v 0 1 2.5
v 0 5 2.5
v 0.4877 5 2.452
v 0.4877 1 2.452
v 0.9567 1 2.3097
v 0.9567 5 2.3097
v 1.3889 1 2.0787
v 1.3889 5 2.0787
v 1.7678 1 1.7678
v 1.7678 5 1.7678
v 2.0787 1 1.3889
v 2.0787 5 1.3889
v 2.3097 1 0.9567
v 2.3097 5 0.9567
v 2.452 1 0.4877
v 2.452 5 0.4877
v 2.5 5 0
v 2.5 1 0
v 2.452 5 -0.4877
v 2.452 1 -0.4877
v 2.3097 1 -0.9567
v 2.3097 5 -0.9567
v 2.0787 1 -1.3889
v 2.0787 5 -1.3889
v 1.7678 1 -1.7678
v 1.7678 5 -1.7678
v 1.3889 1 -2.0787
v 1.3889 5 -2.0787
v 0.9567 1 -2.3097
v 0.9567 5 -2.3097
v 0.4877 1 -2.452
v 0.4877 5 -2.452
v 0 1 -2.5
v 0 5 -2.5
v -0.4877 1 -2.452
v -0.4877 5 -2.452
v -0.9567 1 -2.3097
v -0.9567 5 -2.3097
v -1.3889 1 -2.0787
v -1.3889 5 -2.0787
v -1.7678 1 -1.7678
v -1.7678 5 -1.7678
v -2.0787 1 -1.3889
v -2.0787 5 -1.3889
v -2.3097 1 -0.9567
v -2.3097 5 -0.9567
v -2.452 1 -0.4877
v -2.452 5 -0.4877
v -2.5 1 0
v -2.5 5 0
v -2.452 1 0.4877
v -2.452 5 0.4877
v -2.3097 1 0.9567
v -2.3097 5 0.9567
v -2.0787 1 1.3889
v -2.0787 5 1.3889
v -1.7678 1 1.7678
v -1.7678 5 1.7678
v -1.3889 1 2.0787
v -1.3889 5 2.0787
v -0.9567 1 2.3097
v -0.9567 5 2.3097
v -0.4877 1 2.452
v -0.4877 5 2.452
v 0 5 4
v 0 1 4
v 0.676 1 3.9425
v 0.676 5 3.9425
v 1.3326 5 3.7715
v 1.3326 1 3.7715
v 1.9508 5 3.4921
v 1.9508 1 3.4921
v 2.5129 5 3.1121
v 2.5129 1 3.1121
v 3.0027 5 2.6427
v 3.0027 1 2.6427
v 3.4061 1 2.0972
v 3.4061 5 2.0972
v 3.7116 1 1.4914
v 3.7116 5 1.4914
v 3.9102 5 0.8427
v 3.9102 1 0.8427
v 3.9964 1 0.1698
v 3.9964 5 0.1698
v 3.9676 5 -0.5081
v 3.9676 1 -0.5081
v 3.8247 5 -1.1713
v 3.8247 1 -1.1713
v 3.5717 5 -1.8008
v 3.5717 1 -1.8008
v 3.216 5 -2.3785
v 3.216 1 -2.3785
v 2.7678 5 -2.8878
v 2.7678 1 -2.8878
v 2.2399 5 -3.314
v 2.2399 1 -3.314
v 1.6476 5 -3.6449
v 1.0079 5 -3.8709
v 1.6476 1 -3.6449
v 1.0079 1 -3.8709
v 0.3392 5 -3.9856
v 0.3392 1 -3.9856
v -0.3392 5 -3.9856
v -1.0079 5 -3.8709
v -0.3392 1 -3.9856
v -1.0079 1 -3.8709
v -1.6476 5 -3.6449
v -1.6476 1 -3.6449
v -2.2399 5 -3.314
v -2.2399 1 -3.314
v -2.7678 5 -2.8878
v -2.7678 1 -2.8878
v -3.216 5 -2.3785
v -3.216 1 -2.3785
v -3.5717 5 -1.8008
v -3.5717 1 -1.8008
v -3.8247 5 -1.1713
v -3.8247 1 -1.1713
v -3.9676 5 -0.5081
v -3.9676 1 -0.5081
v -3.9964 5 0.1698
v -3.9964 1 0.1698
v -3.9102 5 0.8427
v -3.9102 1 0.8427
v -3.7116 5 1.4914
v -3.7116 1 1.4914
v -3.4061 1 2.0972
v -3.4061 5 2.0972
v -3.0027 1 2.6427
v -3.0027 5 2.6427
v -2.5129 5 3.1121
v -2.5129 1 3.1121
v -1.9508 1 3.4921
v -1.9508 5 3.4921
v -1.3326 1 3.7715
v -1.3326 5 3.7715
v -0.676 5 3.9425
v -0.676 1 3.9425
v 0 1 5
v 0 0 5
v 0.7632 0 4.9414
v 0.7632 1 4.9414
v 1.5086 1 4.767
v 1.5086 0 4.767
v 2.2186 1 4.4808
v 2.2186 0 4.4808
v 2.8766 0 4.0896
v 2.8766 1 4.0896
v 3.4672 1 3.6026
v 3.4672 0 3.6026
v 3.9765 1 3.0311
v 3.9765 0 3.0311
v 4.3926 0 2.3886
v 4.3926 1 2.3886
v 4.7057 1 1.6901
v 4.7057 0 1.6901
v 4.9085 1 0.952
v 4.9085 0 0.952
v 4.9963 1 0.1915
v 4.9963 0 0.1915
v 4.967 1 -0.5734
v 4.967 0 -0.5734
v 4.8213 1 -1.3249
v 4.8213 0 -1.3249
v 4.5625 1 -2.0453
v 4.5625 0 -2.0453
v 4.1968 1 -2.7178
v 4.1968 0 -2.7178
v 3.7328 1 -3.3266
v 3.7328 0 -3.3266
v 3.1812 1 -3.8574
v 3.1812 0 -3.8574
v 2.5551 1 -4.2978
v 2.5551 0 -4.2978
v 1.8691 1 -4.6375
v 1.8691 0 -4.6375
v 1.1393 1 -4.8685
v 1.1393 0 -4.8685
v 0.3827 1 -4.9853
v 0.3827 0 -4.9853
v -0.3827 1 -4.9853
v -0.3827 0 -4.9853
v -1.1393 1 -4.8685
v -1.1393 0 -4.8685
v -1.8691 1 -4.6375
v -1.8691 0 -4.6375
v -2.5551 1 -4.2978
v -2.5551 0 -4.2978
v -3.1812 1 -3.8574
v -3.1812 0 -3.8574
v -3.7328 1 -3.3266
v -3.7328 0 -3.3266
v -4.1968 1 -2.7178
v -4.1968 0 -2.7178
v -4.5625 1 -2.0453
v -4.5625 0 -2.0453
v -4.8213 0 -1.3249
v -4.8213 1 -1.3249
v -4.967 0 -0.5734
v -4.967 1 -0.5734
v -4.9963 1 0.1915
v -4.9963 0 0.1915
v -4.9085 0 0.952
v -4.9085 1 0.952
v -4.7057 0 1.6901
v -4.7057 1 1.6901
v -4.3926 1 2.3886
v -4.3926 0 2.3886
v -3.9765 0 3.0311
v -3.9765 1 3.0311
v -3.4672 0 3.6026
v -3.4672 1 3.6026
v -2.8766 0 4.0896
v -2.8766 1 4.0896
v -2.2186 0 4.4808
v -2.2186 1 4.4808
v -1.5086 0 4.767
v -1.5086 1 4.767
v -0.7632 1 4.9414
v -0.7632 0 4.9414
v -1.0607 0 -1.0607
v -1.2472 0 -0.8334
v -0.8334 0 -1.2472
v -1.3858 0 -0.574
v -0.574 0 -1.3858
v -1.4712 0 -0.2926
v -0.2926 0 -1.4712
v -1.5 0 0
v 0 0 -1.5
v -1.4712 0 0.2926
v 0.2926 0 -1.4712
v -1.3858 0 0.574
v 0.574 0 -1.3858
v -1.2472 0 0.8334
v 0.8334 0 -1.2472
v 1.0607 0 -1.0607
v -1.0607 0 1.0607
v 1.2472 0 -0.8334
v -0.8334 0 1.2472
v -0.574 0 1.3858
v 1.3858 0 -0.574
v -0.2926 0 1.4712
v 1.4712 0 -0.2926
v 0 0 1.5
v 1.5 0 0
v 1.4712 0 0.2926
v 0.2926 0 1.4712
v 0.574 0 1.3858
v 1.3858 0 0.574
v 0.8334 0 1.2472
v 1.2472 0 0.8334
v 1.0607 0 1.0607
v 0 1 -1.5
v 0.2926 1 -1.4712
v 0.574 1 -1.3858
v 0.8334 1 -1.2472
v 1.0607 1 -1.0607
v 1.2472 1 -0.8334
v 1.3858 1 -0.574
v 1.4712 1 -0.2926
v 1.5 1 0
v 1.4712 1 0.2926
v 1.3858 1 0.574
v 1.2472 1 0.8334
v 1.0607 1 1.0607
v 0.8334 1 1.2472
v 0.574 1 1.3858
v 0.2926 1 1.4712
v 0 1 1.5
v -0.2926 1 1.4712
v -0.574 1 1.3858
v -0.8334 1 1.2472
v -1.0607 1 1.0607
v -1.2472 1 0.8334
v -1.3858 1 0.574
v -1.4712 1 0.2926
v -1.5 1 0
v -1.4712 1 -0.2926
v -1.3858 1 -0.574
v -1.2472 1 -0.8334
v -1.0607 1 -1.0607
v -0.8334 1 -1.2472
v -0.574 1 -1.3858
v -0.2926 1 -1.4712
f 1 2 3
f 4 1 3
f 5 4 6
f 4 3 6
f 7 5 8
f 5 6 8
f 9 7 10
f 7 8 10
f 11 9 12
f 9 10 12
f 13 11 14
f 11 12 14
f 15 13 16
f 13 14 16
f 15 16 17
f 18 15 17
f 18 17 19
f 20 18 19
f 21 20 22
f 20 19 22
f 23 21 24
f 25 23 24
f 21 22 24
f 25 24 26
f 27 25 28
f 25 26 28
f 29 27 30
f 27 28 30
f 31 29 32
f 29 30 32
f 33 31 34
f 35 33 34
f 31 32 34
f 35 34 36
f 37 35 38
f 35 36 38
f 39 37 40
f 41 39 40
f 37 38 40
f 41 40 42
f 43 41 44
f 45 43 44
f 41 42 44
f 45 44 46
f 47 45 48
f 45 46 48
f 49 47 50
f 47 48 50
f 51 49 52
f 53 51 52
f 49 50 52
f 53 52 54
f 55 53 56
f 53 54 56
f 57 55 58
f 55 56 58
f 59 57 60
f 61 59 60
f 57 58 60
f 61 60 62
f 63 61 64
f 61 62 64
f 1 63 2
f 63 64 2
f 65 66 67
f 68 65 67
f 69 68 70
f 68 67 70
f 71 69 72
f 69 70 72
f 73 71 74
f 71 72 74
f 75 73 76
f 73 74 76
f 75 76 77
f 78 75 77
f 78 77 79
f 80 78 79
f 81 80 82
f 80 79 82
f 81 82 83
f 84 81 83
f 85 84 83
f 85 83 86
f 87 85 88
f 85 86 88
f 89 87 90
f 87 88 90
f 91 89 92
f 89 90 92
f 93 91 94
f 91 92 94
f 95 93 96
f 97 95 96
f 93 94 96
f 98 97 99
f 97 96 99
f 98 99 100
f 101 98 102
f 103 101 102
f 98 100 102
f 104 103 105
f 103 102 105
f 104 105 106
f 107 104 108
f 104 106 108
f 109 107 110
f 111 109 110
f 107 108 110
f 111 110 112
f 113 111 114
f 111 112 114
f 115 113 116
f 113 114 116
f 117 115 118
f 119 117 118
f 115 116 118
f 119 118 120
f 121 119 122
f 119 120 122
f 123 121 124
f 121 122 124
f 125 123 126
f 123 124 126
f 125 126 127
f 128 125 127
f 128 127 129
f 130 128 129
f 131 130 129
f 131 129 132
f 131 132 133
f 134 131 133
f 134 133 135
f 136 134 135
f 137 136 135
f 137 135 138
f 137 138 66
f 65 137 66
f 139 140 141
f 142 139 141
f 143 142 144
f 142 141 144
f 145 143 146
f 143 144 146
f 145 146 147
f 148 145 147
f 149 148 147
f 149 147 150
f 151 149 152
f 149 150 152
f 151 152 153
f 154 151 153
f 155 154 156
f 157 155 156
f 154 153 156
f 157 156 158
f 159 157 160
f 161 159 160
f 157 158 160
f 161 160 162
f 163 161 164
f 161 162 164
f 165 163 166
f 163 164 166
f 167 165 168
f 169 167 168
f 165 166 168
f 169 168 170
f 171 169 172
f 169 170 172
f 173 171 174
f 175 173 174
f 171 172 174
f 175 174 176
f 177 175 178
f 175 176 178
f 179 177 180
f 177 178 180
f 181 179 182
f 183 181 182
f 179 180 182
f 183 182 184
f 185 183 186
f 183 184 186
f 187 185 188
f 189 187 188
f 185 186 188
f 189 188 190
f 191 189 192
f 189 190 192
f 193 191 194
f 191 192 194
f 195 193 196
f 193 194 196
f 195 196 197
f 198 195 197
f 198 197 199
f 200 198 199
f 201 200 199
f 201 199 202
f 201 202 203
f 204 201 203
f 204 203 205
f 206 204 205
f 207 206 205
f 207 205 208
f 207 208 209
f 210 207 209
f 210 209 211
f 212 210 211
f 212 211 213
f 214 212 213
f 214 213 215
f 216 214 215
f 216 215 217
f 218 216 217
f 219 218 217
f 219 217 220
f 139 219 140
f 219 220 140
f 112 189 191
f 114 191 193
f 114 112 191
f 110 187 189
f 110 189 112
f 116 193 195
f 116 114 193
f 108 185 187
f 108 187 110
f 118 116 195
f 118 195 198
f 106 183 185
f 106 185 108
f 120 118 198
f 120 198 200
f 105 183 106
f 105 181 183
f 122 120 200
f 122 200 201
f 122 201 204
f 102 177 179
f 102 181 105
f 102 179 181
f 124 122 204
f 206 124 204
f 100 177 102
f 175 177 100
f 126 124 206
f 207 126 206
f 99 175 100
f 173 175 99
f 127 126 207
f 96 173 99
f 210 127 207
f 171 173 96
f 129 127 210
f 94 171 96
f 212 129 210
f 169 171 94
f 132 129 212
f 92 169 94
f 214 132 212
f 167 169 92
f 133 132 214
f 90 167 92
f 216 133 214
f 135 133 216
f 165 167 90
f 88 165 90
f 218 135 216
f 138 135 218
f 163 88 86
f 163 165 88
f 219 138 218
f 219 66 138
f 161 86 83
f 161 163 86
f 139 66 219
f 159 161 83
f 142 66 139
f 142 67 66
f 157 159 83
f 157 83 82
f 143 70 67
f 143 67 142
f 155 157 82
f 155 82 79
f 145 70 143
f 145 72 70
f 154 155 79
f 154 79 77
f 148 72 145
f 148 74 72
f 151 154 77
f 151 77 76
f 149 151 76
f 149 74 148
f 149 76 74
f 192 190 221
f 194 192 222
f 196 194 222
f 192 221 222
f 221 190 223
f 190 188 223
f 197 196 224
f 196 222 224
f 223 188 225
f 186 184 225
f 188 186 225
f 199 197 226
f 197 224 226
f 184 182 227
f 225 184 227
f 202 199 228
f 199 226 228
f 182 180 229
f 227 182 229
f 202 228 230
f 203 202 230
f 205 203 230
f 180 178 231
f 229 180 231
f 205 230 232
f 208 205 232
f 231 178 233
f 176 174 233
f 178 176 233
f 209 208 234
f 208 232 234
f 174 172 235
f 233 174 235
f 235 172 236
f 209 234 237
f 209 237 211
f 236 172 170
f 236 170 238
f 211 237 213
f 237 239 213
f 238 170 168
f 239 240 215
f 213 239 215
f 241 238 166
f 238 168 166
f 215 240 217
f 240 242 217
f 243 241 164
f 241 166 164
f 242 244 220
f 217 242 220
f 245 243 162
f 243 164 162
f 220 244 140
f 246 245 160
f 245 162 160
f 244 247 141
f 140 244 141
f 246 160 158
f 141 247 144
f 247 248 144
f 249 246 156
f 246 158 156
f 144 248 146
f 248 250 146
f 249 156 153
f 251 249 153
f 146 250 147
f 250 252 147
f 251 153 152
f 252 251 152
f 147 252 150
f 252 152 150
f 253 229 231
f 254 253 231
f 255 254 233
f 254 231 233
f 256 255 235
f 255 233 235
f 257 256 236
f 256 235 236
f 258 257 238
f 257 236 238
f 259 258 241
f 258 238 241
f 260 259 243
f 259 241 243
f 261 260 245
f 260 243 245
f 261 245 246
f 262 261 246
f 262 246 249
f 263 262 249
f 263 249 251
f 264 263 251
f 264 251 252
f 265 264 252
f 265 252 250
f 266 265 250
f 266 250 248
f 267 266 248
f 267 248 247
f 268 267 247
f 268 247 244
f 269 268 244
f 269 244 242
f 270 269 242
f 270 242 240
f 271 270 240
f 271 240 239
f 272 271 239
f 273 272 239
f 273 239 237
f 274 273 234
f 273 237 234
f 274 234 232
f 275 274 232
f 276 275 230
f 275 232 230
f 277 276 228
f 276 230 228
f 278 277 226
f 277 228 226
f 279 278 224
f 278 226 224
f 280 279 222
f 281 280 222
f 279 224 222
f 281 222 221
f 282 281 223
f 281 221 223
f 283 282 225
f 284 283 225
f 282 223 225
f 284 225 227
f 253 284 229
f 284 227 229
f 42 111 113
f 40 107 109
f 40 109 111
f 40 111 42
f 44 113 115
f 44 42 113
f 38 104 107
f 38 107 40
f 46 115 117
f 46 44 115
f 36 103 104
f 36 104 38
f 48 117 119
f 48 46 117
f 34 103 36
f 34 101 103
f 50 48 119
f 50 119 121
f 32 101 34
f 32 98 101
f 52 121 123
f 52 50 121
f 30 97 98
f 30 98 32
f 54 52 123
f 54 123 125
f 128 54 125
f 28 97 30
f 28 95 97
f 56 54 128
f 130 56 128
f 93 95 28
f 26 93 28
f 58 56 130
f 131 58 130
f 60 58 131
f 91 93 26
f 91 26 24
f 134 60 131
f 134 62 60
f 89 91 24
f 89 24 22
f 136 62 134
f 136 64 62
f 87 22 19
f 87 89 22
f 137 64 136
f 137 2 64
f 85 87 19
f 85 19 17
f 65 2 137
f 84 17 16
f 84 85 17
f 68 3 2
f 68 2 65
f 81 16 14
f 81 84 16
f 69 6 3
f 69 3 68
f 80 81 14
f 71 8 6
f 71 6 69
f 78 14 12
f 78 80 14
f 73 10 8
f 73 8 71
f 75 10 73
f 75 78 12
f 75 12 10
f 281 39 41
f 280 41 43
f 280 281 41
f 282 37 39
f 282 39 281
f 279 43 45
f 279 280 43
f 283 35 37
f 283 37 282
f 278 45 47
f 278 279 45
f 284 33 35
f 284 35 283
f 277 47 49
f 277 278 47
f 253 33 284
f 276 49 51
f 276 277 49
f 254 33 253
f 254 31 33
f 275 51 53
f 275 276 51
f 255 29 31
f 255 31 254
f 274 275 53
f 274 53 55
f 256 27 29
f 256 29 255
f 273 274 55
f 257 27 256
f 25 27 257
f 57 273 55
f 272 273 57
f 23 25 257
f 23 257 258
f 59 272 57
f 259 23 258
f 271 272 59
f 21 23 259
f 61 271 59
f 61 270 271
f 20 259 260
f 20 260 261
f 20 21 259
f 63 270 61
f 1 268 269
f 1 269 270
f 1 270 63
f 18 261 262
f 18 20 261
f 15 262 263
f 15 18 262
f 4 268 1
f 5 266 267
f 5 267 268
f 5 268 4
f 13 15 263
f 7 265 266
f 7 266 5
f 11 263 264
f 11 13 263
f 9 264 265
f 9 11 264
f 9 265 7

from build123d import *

# Parameters (mm, degrees)
SKETCH1_R           = 5
BOSS_EXTRUDE1_DEPTH = 1
SKETCH2_R           = 4
BOSS_EXTRUDE4_DEPTH = 4
SKETCH5_R           = 2.5
CUT_EXTRUDE4_DEPTH  = 4
SKETCH6_R           = 1.25
CUT_EXTRUDE5_DEPTH  = 4
SKETCH7_R           = 1.5
CUT_EXTRUDE6_DEPTH  = 10


with BuildPart() as part:
    # Sketch1 → Boss-Extrude1 (new body)
    with BuildSketch(Plane(origin=(0, 0, 0), x_dir=(1, 0, 0), z_dir=(0, 1, 0))):
        with Locations(Location((0, 0, 0), (0, 0, 270))):
            Circle(SKETCH1_R)
    extrude(amount=BOSS_EXTRUDE1_DEPTH)

    # Sketch2 → Boss-Extrude4 (add)
    with BuildSketch(Plane(origin=(0, 1, 0), x_dir=(1, 0, 0), z_dir=(0, 1, 0))):
        with Locations(Location((0, 0, 0), (0, 0, 270))):
            Circle(SKETCH2_R)
    extrude(amount=BOSS_EXTRUDE4_DEPTH)

    # Sketch5 → Cut-Extrude4 (cut)
    with BuildSketch(Plane(origin=(0, 5, 0), x_dir=(1, 0, 0), z_dir=(0, 1, 0))):
        with Locations(Location((0, 0, 0), (0, 0, 270))):
            Circle(SKETCH5_R)
    extrude(amount=-CUT_EXTRUDE4_DEPTH, mode=Mode.SUBTRACT)

    # Sketch6 → Cut-Extrude5 (cut)
    with BuildSketch(Plane(origin=(0, 1, 0), x_dir=(1, 0, 0), z_dir=(0, 1, 0))):
        with Locations(Location((0, 0, 0), (0, 0, 270))):
            Circle(SKETCH6_R)
    extrude(amount=-CUT_EXTRUDE5_DEPTH, mode=Mode.SUBTRACT)

    # Sketch7 → Cut-Extrude6 (cut)
    with BuildSketch(Plane.XZ):
        with Locations(Location((0, 0, 0), (0, 0, 270))):
            Circle(SKETCH7_R)
    extrude(amount=-CUT_EXTRUDE6_DEPTH, mode=Mode.SUBTRACT)


solid = part.part
